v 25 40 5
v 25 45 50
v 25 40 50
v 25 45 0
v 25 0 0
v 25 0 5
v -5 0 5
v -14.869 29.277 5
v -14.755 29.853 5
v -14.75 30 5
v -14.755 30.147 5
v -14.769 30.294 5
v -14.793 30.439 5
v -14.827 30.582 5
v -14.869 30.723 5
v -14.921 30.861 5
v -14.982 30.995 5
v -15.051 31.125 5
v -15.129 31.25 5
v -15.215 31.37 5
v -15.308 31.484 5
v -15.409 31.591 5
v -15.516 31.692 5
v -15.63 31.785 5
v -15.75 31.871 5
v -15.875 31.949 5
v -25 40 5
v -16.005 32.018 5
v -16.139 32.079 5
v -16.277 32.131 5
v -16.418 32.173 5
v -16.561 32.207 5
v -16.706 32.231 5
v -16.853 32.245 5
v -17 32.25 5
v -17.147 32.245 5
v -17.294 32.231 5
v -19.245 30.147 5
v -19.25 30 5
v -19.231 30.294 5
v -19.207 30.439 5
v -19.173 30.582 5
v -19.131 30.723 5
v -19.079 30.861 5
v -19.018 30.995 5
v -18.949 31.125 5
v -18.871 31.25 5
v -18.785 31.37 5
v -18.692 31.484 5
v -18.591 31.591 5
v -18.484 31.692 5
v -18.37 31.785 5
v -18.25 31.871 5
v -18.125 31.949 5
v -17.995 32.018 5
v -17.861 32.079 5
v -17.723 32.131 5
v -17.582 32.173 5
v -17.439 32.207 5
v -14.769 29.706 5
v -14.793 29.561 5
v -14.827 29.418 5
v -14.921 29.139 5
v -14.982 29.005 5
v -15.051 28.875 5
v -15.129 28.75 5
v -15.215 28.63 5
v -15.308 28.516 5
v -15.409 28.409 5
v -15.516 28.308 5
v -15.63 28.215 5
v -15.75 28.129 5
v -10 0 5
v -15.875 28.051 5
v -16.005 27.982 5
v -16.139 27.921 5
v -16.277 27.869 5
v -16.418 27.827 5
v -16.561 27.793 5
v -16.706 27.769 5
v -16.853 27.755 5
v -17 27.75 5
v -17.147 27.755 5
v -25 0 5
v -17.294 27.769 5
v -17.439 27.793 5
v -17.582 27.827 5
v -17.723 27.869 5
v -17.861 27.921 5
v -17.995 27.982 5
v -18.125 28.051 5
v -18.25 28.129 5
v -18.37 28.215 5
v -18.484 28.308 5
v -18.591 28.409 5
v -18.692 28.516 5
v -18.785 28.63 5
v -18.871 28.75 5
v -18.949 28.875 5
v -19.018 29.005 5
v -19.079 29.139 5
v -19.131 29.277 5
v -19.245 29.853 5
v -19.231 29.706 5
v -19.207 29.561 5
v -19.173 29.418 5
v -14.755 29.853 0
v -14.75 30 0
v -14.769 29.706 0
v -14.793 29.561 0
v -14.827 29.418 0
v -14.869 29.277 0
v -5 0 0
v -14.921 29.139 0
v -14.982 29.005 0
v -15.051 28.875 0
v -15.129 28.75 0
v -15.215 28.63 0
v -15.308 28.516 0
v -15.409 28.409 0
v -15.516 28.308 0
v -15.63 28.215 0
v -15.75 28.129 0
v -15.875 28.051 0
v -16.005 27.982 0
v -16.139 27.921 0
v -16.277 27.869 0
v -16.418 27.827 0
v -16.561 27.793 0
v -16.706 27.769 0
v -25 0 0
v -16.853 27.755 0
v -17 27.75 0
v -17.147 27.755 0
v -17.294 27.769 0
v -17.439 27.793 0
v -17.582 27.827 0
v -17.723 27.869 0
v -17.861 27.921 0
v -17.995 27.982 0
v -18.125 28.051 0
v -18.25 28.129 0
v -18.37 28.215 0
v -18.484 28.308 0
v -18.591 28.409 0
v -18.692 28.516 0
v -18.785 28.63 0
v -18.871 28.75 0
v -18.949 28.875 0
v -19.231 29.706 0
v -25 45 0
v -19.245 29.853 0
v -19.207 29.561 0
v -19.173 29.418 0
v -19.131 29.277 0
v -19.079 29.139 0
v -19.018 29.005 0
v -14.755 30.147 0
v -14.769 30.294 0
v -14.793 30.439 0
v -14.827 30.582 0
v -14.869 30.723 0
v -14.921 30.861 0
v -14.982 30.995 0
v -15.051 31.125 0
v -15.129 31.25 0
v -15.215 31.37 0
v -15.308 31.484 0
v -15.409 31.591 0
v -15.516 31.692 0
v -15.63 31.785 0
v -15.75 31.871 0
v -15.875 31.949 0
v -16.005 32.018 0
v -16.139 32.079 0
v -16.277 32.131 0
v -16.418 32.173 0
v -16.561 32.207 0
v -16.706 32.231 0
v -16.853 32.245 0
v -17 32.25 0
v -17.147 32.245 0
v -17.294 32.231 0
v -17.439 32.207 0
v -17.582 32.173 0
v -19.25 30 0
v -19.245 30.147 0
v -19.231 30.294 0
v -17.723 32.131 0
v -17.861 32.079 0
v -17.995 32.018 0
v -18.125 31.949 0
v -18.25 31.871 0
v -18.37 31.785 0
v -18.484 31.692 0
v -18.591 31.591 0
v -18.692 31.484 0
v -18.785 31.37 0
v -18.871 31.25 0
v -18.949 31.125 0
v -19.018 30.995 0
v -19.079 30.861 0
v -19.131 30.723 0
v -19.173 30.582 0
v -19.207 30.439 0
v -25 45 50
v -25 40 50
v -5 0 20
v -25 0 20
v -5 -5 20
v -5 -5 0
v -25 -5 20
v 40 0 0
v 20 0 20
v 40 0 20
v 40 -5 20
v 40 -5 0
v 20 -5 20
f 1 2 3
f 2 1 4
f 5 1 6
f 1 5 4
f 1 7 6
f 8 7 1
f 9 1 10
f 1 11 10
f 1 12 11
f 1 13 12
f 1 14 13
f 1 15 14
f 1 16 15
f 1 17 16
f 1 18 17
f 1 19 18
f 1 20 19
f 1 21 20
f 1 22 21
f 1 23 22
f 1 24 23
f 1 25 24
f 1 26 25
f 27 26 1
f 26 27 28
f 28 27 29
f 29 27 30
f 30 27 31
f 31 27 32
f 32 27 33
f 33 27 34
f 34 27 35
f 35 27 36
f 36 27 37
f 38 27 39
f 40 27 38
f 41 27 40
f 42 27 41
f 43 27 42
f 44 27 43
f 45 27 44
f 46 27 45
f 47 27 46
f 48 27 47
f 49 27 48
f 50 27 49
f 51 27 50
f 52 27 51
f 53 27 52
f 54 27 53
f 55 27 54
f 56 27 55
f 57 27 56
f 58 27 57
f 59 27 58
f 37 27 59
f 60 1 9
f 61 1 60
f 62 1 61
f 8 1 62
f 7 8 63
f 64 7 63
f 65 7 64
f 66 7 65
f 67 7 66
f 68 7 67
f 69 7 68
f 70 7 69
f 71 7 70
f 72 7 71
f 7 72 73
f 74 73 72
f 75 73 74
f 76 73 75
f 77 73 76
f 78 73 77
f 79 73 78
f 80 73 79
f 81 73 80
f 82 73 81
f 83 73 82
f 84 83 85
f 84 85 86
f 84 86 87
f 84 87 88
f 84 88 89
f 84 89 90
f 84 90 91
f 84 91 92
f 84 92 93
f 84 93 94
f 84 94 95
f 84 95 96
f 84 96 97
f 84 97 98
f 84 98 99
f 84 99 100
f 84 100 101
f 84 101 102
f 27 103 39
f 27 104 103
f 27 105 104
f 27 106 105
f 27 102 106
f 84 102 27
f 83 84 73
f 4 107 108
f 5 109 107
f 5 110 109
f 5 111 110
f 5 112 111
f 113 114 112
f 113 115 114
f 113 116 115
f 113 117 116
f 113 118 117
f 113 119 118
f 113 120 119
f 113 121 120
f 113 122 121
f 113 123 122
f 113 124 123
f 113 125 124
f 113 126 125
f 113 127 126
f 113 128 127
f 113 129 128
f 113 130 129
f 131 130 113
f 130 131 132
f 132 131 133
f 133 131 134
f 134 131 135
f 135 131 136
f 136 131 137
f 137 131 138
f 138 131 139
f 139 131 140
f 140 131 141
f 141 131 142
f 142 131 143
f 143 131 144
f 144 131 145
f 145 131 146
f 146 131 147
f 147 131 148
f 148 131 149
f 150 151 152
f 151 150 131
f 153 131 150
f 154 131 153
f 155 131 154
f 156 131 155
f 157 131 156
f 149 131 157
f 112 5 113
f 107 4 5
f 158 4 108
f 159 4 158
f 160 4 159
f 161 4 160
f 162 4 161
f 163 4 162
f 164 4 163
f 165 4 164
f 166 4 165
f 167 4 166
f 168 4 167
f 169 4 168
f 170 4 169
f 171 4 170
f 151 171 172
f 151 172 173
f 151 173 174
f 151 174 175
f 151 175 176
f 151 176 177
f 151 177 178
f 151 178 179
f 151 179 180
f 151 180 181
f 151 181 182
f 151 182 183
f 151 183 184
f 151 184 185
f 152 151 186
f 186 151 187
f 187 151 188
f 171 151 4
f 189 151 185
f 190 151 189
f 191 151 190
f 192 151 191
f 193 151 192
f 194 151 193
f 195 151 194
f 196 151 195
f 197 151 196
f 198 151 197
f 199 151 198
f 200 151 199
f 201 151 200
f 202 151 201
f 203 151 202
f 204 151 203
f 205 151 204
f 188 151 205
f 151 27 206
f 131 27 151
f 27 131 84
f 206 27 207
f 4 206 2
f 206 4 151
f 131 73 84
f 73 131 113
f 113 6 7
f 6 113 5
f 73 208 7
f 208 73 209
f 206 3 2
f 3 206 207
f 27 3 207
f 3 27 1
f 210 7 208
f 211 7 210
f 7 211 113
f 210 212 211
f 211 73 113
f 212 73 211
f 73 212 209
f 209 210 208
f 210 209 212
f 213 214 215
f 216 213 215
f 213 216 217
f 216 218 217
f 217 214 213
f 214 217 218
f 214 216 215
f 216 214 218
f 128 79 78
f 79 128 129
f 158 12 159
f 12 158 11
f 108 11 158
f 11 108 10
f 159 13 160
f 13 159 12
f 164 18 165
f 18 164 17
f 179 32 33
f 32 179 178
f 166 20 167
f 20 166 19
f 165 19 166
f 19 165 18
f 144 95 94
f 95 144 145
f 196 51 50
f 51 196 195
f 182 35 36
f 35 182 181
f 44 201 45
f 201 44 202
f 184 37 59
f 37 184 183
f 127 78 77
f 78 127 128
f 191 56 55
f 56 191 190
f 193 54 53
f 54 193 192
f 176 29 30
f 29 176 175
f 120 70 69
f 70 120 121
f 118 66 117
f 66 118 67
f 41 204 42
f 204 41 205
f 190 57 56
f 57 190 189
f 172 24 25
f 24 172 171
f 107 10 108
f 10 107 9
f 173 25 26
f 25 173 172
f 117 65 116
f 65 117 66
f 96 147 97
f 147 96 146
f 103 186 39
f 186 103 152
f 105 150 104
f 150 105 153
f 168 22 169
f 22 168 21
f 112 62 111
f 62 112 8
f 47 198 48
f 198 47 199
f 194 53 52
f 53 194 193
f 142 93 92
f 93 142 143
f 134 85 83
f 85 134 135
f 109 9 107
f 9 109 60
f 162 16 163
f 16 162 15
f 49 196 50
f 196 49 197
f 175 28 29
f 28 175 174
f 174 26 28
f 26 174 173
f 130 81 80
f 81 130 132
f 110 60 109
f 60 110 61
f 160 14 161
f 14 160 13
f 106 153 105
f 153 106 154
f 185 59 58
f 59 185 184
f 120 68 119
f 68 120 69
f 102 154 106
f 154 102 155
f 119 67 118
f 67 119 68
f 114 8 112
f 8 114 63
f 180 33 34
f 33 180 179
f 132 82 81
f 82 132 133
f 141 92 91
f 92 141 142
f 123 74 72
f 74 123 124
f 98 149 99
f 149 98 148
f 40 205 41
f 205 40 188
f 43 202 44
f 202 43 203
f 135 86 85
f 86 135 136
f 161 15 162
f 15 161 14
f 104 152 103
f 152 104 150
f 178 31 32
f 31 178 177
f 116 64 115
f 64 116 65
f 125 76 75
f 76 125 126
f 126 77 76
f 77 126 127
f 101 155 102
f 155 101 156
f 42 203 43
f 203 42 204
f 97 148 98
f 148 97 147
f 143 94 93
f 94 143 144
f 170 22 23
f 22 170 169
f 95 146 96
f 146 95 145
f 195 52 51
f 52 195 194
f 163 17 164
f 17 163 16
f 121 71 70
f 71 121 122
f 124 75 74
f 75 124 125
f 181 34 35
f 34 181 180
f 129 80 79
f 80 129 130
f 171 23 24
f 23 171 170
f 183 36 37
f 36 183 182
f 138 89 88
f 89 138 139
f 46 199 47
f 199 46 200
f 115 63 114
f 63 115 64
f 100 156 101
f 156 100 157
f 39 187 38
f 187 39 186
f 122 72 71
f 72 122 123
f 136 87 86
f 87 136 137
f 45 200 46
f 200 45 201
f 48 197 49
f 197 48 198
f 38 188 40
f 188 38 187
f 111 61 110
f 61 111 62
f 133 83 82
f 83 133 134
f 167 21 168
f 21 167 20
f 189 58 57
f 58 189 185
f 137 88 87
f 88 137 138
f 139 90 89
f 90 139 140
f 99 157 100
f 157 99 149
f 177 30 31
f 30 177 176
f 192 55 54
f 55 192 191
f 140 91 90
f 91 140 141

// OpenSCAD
// L-shaped mounting bracket for NEMA 17 stepper motor (syringe pump)
// Print orientation: base plate on bed, motor plate building up in +Z

// ---------------- Parameters ----------------
plate_x       = 25;    // base plate half-width (X)
plate_y       = 45;    // base plate length (Y)
plate_z       = 5;     // base plate thickness (Z)

motor_h       = 50;    // motor plate height (Z)
motor_w       = 5;     // motor plate thickness (Y)

boss_d        = 23;    // motor boss hole diameter
boss_x        = 0;     // boss hole X position
boss_z        = 28;    // boss hole Z position

screw_d       = 3.4;   // M3 screw hole diameter
screw_pattern = 31;    // square pitch of screw holes

gusset_t      = 5;     // gusset thickness (X)
gusset_leg    = 20;    // gusset leg lengths (Y and Z)

eps           = 0.5;   // cutter overshoot past faces
$fn           = 96;    // curve resolution

// ---------------- Model ----------------
difference() {
    union() {
        // Base plate
        translate([-plate_x, 0, 0])
            cube([plate_x * 2, plate_y, plate_z]);

        // Motor plate (standing on back edge of base)
        translate([-plate_x, plate_y - motor_w, 0])
            cube([plate_x * 2, motor_w, motor_h]);

        // Left gusset: right triangle in YZ, flushed with left edge
        translate([-plate_x, 0, 0])
            rotate([90, 0, 0])
                linear_extrude(height = gusset_t)
                    polygon(points = [
                        [gusset_leg, gusset_leg],
                        [gusset_leg, 0],
                        [0, gusset_leg]
                    ]);

        // Right gusset: right triangle in YZ, flushed with right edge
        translate([plate_x - gusset_t, 0, 0])
            rotate([90, 0, 0])
                linear_extrude(height = gusset_t)
                    polygon(points = [
                        [gusset_leg, gusset_leg],
                        [gusset_leg, 0],
                        [0, gusset_leg]
                    ]);
    }

    // Base plate through-holes (M4)
    for (h = [-1, 1])
        translate([-17, 30, -eps * h])
            cylinder(d = 4.5, h = plate_z + 2 * eps * h);

    // Motor boss hole (along Y)
    translate([boss_x, plate_y / 2 - eps, boss_z])
        rotate([0, 90, 0])
            cylinder(d = boss_d, h = motor_w + 2 * eps);

    // M3 screw holes on square pattern, centred on boss hole
    for (i = [-1, 1])
        for (j = [-1, 1])
            translate([i * screw_pattern / 2, j * screw_pattern / 2, plate_y / 2 - eps])
                rotate([0, 90, 0])
                    cylinder(d = screw_d, h = motor_w + 2 * eps);
}
